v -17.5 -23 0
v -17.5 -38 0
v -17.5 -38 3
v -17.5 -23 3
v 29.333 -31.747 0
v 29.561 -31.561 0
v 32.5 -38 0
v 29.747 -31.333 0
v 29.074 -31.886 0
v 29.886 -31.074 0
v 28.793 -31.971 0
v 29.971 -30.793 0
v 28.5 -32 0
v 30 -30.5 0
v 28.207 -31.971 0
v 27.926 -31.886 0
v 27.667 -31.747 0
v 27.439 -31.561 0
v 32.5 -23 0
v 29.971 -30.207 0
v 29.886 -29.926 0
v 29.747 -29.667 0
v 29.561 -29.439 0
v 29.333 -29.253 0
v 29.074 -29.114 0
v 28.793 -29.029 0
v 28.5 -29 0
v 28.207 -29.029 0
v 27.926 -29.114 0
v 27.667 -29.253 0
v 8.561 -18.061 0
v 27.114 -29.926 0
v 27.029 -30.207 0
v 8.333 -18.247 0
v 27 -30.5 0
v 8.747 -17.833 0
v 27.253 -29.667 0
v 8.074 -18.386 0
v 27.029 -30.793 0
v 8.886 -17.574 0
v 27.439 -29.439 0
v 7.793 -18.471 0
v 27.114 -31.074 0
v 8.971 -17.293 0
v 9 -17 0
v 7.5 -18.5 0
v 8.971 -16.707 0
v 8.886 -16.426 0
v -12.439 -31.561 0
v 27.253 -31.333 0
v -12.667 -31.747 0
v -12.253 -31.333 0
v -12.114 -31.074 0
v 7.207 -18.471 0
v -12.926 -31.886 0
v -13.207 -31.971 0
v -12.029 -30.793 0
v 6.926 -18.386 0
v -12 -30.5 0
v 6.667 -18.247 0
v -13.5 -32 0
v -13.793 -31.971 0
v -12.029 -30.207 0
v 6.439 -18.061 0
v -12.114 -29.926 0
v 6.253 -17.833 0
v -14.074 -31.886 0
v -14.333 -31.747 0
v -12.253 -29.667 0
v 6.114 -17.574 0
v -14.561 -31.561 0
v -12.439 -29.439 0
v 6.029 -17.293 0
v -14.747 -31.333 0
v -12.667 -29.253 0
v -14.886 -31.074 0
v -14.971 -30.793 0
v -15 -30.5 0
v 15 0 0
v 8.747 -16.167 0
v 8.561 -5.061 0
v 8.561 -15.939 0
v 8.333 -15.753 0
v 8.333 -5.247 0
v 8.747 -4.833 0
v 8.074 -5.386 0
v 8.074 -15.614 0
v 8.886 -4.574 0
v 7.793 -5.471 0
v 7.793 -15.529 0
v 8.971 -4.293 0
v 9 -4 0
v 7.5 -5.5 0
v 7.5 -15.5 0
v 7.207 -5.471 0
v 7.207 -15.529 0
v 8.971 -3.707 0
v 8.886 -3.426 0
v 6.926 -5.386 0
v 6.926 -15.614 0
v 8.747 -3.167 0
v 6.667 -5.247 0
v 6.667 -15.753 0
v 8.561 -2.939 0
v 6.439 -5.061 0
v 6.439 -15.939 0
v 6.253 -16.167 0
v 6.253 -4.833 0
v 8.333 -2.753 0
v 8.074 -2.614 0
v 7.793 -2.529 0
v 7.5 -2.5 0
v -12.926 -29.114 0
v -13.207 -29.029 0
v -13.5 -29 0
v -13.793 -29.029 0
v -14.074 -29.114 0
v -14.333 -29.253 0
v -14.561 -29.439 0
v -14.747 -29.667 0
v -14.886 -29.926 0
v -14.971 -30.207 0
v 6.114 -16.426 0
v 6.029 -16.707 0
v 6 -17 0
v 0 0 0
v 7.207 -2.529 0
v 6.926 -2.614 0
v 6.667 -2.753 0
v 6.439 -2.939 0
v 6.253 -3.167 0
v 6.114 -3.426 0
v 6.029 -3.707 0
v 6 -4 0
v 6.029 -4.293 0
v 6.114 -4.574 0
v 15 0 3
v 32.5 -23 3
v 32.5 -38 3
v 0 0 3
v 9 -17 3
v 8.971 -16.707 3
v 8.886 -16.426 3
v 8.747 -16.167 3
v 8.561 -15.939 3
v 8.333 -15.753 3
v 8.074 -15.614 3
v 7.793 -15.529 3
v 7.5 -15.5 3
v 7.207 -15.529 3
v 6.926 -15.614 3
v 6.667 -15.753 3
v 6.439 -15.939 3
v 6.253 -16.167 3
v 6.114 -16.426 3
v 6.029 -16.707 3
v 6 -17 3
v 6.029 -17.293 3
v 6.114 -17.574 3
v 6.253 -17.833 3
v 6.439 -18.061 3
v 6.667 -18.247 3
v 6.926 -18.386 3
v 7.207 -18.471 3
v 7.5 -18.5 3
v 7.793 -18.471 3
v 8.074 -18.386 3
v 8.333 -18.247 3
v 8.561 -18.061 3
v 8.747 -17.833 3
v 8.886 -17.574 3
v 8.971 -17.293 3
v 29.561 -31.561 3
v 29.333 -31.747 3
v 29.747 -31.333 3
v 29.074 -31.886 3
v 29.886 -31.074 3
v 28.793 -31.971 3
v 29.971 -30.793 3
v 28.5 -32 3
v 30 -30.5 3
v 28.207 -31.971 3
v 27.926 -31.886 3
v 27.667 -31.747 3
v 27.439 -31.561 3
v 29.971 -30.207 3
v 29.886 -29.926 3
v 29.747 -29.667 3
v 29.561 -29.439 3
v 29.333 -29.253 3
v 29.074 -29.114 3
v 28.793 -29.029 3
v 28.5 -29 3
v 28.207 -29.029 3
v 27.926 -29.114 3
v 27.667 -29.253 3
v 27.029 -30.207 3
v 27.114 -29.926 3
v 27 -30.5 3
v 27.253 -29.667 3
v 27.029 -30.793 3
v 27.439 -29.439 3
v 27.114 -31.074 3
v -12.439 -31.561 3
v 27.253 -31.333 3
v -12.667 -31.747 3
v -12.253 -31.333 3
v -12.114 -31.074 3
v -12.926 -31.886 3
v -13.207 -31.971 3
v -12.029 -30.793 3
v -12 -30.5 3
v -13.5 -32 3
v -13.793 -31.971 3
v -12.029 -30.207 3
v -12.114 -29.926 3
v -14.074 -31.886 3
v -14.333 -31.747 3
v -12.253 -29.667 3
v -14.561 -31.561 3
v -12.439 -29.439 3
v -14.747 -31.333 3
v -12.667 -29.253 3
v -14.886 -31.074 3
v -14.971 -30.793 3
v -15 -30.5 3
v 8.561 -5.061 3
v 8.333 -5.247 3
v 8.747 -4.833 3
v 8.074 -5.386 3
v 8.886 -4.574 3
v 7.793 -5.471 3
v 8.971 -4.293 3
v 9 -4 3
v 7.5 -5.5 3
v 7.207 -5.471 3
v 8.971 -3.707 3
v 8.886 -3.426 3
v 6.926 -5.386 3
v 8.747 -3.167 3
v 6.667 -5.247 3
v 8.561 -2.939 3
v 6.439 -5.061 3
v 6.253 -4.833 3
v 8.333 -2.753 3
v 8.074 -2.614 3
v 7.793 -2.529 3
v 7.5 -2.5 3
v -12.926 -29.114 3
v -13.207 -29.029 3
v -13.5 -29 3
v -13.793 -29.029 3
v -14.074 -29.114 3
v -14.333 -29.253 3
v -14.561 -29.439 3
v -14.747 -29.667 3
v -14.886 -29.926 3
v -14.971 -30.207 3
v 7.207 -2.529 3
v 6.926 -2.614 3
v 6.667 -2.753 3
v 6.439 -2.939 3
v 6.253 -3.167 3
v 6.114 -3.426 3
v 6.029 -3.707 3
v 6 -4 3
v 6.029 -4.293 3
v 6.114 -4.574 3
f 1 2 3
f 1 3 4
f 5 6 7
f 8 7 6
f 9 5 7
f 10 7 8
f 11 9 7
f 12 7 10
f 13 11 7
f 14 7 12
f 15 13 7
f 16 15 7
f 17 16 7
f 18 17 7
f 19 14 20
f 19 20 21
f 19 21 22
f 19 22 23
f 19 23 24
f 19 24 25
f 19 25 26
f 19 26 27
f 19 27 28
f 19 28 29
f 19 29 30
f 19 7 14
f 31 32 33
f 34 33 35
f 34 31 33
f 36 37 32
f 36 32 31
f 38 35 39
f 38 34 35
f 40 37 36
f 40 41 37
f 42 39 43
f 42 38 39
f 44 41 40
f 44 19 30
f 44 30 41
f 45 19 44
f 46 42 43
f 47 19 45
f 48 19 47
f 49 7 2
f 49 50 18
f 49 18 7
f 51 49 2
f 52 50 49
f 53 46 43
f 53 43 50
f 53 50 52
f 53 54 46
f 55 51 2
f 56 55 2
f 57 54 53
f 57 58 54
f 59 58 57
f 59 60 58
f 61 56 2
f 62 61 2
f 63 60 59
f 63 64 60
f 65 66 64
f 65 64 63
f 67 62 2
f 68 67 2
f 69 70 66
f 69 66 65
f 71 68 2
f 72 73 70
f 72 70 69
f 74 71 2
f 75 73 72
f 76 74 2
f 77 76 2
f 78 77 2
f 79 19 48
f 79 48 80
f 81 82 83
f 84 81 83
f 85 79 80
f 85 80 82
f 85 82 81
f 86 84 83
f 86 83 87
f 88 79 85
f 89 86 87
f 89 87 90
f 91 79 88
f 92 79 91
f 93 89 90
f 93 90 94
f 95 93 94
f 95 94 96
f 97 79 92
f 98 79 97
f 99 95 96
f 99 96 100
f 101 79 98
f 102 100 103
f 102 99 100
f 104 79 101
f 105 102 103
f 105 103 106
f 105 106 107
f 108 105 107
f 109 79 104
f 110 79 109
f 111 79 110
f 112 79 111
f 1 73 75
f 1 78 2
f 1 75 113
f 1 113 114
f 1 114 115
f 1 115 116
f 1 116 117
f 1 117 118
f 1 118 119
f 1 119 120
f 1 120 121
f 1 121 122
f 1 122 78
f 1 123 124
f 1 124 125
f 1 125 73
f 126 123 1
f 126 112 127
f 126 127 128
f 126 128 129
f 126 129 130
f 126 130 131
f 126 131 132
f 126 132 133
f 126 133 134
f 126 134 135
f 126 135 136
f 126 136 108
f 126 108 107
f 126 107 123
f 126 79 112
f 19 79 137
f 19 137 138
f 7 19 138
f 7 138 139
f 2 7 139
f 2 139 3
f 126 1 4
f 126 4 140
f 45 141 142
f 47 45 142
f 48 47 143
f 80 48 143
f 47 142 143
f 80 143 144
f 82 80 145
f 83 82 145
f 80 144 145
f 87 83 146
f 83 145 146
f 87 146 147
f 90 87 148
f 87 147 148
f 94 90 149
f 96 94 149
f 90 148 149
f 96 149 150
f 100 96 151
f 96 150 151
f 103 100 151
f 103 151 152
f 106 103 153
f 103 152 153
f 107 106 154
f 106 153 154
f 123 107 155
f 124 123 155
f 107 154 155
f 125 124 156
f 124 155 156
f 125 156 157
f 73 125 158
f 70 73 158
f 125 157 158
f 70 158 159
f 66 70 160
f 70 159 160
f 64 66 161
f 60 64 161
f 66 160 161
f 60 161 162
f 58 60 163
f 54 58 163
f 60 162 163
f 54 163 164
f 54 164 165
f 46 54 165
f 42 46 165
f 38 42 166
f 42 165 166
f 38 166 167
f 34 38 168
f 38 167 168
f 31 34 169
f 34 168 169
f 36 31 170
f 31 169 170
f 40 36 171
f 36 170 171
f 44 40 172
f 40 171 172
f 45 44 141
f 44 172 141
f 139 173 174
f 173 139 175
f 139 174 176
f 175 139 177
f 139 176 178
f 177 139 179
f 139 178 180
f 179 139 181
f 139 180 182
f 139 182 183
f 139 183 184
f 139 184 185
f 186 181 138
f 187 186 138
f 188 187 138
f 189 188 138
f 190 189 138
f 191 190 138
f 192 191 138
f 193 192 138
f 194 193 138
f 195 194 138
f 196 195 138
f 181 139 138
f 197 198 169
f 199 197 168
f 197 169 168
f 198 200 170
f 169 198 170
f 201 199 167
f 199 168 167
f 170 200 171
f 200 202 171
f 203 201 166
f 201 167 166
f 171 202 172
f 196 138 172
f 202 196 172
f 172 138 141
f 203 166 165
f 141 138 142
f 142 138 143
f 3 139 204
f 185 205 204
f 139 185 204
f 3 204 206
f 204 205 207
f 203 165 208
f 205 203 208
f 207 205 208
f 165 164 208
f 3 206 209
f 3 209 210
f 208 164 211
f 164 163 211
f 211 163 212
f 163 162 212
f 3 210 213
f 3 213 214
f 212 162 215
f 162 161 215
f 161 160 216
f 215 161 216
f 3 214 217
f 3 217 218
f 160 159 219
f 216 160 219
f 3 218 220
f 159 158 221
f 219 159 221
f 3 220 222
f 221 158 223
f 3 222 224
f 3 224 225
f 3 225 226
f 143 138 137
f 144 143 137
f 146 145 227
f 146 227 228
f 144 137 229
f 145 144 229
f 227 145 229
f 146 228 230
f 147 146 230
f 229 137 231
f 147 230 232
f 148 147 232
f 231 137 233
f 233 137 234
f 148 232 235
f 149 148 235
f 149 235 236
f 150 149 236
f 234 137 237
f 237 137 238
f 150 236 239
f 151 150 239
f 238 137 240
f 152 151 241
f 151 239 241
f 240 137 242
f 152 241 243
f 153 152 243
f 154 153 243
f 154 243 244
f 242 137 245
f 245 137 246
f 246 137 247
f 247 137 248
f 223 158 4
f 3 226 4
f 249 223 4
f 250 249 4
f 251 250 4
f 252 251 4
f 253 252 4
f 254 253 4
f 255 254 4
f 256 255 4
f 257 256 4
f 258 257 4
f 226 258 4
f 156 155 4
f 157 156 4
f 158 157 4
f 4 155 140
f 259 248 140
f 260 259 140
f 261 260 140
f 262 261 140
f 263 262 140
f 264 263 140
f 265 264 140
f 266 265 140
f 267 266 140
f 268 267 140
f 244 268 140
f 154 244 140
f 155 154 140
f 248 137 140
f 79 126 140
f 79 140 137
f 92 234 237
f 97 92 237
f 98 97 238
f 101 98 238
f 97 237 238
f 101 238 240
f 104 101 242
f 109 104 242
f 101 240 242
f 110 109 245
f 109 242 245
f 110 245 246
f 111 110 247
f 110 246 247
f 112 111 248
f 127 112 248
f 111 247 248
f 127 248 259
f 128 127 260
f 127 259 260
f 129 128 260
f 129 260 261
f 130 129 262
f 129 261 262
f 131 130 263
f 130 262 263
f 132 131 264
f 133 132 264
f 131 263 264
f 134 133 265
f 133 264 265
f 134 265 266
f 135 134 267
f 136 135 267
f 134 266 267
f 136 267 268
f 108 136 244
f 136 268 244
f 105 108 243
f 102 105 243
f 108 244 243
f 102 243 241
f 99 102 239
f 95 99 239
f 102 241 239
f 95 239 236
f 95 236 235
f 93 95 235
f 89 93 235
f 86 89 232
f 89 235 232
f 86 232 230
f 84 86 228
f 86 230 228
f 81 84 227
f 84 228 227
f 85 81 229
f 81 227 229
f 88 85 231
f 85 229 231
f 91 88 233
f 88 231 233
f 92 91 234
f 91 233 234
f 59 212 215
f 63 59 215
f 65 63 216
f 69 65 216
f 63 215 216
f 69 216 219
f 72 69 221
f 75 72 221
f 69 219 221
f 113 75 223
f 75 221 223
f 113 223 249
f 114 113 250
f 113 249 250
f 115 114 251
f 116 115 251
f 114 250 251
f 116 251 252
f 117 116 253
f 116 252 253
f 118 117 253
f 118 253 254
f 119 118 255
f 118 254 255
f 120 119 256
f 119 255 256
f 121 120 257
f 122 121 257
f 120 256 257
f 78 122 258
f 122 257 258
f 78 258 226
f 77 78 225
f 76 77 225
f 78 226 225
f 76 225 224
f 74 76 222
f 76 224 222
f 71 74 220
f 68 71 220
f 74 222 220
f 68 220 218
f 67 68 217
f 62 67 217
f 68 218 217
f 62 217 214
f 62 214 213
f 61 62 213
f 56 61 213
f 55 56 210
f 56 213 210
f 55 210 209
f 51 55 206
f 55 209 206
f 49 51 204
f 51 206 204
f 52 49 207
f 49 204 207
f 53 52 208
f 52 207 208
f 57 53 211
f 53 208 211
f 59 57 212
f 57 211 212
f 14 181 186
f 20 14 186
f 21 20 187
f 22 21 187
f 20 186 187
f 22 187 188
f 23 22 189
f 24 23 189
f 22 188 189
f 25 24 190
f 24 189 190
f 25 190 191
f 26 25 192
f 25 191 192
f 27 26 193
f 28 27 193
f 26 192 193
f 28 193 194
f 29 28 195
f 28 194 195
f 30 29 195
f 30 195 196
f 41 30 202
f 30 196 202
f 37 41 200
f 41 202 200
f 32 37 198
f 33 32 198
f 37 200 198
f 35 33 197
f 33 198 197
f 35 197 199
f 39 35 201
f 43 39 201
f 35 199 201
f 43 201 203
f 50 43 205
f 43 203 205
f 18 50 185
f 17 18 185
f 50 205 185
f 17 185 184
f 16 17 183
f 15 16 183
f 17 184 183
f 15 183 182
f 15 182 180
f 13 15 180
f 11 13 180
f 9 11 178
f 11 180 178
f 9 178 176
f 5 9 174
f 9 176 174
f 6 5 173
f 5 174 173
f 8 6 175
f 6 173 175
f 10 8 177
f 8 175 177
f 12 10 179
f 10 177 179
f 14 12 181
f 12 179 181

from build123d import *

# Parameters (mm, degrees)
EXTRUDE_1_DEPTH     = 3
SKETCH_2_R          = 1.5
CUT_EXTRUDE_1_DEPTH = 3


with BuildPart() as part:
    # 草图1 → 凸台-拉伸1 (new body)
    with BuildSketch(Plane.XY):
        Polygon((0, 0), (15, 0), (32.5, -23), (32.5, -38), (-17.5, -38), (-17.5, -23), align=None)
    extrude(amount=EXTRUDE_1_DEPTH)

    # 草图2 → 切除-拉伸1 (cut)
    with BuildSketch(Plane.XY.offset(3)):
        with Locations((7.5, -4)):
            Circle(SKETCH_2_R)
        with Locations((7.5, -17)):
            Circle(SKETCH_2_R)
        with Locations((28.5, -30.5)):
            Circle(SKETCH_2_R)
        with Locations((-13.5, -30.5)):
            Circle(SKETCH_2_R)
    extrude(amount=-CUT_EXTRUDE_1_DEPTH, mode=Mode.SUBTRACT)


solid = part.part
